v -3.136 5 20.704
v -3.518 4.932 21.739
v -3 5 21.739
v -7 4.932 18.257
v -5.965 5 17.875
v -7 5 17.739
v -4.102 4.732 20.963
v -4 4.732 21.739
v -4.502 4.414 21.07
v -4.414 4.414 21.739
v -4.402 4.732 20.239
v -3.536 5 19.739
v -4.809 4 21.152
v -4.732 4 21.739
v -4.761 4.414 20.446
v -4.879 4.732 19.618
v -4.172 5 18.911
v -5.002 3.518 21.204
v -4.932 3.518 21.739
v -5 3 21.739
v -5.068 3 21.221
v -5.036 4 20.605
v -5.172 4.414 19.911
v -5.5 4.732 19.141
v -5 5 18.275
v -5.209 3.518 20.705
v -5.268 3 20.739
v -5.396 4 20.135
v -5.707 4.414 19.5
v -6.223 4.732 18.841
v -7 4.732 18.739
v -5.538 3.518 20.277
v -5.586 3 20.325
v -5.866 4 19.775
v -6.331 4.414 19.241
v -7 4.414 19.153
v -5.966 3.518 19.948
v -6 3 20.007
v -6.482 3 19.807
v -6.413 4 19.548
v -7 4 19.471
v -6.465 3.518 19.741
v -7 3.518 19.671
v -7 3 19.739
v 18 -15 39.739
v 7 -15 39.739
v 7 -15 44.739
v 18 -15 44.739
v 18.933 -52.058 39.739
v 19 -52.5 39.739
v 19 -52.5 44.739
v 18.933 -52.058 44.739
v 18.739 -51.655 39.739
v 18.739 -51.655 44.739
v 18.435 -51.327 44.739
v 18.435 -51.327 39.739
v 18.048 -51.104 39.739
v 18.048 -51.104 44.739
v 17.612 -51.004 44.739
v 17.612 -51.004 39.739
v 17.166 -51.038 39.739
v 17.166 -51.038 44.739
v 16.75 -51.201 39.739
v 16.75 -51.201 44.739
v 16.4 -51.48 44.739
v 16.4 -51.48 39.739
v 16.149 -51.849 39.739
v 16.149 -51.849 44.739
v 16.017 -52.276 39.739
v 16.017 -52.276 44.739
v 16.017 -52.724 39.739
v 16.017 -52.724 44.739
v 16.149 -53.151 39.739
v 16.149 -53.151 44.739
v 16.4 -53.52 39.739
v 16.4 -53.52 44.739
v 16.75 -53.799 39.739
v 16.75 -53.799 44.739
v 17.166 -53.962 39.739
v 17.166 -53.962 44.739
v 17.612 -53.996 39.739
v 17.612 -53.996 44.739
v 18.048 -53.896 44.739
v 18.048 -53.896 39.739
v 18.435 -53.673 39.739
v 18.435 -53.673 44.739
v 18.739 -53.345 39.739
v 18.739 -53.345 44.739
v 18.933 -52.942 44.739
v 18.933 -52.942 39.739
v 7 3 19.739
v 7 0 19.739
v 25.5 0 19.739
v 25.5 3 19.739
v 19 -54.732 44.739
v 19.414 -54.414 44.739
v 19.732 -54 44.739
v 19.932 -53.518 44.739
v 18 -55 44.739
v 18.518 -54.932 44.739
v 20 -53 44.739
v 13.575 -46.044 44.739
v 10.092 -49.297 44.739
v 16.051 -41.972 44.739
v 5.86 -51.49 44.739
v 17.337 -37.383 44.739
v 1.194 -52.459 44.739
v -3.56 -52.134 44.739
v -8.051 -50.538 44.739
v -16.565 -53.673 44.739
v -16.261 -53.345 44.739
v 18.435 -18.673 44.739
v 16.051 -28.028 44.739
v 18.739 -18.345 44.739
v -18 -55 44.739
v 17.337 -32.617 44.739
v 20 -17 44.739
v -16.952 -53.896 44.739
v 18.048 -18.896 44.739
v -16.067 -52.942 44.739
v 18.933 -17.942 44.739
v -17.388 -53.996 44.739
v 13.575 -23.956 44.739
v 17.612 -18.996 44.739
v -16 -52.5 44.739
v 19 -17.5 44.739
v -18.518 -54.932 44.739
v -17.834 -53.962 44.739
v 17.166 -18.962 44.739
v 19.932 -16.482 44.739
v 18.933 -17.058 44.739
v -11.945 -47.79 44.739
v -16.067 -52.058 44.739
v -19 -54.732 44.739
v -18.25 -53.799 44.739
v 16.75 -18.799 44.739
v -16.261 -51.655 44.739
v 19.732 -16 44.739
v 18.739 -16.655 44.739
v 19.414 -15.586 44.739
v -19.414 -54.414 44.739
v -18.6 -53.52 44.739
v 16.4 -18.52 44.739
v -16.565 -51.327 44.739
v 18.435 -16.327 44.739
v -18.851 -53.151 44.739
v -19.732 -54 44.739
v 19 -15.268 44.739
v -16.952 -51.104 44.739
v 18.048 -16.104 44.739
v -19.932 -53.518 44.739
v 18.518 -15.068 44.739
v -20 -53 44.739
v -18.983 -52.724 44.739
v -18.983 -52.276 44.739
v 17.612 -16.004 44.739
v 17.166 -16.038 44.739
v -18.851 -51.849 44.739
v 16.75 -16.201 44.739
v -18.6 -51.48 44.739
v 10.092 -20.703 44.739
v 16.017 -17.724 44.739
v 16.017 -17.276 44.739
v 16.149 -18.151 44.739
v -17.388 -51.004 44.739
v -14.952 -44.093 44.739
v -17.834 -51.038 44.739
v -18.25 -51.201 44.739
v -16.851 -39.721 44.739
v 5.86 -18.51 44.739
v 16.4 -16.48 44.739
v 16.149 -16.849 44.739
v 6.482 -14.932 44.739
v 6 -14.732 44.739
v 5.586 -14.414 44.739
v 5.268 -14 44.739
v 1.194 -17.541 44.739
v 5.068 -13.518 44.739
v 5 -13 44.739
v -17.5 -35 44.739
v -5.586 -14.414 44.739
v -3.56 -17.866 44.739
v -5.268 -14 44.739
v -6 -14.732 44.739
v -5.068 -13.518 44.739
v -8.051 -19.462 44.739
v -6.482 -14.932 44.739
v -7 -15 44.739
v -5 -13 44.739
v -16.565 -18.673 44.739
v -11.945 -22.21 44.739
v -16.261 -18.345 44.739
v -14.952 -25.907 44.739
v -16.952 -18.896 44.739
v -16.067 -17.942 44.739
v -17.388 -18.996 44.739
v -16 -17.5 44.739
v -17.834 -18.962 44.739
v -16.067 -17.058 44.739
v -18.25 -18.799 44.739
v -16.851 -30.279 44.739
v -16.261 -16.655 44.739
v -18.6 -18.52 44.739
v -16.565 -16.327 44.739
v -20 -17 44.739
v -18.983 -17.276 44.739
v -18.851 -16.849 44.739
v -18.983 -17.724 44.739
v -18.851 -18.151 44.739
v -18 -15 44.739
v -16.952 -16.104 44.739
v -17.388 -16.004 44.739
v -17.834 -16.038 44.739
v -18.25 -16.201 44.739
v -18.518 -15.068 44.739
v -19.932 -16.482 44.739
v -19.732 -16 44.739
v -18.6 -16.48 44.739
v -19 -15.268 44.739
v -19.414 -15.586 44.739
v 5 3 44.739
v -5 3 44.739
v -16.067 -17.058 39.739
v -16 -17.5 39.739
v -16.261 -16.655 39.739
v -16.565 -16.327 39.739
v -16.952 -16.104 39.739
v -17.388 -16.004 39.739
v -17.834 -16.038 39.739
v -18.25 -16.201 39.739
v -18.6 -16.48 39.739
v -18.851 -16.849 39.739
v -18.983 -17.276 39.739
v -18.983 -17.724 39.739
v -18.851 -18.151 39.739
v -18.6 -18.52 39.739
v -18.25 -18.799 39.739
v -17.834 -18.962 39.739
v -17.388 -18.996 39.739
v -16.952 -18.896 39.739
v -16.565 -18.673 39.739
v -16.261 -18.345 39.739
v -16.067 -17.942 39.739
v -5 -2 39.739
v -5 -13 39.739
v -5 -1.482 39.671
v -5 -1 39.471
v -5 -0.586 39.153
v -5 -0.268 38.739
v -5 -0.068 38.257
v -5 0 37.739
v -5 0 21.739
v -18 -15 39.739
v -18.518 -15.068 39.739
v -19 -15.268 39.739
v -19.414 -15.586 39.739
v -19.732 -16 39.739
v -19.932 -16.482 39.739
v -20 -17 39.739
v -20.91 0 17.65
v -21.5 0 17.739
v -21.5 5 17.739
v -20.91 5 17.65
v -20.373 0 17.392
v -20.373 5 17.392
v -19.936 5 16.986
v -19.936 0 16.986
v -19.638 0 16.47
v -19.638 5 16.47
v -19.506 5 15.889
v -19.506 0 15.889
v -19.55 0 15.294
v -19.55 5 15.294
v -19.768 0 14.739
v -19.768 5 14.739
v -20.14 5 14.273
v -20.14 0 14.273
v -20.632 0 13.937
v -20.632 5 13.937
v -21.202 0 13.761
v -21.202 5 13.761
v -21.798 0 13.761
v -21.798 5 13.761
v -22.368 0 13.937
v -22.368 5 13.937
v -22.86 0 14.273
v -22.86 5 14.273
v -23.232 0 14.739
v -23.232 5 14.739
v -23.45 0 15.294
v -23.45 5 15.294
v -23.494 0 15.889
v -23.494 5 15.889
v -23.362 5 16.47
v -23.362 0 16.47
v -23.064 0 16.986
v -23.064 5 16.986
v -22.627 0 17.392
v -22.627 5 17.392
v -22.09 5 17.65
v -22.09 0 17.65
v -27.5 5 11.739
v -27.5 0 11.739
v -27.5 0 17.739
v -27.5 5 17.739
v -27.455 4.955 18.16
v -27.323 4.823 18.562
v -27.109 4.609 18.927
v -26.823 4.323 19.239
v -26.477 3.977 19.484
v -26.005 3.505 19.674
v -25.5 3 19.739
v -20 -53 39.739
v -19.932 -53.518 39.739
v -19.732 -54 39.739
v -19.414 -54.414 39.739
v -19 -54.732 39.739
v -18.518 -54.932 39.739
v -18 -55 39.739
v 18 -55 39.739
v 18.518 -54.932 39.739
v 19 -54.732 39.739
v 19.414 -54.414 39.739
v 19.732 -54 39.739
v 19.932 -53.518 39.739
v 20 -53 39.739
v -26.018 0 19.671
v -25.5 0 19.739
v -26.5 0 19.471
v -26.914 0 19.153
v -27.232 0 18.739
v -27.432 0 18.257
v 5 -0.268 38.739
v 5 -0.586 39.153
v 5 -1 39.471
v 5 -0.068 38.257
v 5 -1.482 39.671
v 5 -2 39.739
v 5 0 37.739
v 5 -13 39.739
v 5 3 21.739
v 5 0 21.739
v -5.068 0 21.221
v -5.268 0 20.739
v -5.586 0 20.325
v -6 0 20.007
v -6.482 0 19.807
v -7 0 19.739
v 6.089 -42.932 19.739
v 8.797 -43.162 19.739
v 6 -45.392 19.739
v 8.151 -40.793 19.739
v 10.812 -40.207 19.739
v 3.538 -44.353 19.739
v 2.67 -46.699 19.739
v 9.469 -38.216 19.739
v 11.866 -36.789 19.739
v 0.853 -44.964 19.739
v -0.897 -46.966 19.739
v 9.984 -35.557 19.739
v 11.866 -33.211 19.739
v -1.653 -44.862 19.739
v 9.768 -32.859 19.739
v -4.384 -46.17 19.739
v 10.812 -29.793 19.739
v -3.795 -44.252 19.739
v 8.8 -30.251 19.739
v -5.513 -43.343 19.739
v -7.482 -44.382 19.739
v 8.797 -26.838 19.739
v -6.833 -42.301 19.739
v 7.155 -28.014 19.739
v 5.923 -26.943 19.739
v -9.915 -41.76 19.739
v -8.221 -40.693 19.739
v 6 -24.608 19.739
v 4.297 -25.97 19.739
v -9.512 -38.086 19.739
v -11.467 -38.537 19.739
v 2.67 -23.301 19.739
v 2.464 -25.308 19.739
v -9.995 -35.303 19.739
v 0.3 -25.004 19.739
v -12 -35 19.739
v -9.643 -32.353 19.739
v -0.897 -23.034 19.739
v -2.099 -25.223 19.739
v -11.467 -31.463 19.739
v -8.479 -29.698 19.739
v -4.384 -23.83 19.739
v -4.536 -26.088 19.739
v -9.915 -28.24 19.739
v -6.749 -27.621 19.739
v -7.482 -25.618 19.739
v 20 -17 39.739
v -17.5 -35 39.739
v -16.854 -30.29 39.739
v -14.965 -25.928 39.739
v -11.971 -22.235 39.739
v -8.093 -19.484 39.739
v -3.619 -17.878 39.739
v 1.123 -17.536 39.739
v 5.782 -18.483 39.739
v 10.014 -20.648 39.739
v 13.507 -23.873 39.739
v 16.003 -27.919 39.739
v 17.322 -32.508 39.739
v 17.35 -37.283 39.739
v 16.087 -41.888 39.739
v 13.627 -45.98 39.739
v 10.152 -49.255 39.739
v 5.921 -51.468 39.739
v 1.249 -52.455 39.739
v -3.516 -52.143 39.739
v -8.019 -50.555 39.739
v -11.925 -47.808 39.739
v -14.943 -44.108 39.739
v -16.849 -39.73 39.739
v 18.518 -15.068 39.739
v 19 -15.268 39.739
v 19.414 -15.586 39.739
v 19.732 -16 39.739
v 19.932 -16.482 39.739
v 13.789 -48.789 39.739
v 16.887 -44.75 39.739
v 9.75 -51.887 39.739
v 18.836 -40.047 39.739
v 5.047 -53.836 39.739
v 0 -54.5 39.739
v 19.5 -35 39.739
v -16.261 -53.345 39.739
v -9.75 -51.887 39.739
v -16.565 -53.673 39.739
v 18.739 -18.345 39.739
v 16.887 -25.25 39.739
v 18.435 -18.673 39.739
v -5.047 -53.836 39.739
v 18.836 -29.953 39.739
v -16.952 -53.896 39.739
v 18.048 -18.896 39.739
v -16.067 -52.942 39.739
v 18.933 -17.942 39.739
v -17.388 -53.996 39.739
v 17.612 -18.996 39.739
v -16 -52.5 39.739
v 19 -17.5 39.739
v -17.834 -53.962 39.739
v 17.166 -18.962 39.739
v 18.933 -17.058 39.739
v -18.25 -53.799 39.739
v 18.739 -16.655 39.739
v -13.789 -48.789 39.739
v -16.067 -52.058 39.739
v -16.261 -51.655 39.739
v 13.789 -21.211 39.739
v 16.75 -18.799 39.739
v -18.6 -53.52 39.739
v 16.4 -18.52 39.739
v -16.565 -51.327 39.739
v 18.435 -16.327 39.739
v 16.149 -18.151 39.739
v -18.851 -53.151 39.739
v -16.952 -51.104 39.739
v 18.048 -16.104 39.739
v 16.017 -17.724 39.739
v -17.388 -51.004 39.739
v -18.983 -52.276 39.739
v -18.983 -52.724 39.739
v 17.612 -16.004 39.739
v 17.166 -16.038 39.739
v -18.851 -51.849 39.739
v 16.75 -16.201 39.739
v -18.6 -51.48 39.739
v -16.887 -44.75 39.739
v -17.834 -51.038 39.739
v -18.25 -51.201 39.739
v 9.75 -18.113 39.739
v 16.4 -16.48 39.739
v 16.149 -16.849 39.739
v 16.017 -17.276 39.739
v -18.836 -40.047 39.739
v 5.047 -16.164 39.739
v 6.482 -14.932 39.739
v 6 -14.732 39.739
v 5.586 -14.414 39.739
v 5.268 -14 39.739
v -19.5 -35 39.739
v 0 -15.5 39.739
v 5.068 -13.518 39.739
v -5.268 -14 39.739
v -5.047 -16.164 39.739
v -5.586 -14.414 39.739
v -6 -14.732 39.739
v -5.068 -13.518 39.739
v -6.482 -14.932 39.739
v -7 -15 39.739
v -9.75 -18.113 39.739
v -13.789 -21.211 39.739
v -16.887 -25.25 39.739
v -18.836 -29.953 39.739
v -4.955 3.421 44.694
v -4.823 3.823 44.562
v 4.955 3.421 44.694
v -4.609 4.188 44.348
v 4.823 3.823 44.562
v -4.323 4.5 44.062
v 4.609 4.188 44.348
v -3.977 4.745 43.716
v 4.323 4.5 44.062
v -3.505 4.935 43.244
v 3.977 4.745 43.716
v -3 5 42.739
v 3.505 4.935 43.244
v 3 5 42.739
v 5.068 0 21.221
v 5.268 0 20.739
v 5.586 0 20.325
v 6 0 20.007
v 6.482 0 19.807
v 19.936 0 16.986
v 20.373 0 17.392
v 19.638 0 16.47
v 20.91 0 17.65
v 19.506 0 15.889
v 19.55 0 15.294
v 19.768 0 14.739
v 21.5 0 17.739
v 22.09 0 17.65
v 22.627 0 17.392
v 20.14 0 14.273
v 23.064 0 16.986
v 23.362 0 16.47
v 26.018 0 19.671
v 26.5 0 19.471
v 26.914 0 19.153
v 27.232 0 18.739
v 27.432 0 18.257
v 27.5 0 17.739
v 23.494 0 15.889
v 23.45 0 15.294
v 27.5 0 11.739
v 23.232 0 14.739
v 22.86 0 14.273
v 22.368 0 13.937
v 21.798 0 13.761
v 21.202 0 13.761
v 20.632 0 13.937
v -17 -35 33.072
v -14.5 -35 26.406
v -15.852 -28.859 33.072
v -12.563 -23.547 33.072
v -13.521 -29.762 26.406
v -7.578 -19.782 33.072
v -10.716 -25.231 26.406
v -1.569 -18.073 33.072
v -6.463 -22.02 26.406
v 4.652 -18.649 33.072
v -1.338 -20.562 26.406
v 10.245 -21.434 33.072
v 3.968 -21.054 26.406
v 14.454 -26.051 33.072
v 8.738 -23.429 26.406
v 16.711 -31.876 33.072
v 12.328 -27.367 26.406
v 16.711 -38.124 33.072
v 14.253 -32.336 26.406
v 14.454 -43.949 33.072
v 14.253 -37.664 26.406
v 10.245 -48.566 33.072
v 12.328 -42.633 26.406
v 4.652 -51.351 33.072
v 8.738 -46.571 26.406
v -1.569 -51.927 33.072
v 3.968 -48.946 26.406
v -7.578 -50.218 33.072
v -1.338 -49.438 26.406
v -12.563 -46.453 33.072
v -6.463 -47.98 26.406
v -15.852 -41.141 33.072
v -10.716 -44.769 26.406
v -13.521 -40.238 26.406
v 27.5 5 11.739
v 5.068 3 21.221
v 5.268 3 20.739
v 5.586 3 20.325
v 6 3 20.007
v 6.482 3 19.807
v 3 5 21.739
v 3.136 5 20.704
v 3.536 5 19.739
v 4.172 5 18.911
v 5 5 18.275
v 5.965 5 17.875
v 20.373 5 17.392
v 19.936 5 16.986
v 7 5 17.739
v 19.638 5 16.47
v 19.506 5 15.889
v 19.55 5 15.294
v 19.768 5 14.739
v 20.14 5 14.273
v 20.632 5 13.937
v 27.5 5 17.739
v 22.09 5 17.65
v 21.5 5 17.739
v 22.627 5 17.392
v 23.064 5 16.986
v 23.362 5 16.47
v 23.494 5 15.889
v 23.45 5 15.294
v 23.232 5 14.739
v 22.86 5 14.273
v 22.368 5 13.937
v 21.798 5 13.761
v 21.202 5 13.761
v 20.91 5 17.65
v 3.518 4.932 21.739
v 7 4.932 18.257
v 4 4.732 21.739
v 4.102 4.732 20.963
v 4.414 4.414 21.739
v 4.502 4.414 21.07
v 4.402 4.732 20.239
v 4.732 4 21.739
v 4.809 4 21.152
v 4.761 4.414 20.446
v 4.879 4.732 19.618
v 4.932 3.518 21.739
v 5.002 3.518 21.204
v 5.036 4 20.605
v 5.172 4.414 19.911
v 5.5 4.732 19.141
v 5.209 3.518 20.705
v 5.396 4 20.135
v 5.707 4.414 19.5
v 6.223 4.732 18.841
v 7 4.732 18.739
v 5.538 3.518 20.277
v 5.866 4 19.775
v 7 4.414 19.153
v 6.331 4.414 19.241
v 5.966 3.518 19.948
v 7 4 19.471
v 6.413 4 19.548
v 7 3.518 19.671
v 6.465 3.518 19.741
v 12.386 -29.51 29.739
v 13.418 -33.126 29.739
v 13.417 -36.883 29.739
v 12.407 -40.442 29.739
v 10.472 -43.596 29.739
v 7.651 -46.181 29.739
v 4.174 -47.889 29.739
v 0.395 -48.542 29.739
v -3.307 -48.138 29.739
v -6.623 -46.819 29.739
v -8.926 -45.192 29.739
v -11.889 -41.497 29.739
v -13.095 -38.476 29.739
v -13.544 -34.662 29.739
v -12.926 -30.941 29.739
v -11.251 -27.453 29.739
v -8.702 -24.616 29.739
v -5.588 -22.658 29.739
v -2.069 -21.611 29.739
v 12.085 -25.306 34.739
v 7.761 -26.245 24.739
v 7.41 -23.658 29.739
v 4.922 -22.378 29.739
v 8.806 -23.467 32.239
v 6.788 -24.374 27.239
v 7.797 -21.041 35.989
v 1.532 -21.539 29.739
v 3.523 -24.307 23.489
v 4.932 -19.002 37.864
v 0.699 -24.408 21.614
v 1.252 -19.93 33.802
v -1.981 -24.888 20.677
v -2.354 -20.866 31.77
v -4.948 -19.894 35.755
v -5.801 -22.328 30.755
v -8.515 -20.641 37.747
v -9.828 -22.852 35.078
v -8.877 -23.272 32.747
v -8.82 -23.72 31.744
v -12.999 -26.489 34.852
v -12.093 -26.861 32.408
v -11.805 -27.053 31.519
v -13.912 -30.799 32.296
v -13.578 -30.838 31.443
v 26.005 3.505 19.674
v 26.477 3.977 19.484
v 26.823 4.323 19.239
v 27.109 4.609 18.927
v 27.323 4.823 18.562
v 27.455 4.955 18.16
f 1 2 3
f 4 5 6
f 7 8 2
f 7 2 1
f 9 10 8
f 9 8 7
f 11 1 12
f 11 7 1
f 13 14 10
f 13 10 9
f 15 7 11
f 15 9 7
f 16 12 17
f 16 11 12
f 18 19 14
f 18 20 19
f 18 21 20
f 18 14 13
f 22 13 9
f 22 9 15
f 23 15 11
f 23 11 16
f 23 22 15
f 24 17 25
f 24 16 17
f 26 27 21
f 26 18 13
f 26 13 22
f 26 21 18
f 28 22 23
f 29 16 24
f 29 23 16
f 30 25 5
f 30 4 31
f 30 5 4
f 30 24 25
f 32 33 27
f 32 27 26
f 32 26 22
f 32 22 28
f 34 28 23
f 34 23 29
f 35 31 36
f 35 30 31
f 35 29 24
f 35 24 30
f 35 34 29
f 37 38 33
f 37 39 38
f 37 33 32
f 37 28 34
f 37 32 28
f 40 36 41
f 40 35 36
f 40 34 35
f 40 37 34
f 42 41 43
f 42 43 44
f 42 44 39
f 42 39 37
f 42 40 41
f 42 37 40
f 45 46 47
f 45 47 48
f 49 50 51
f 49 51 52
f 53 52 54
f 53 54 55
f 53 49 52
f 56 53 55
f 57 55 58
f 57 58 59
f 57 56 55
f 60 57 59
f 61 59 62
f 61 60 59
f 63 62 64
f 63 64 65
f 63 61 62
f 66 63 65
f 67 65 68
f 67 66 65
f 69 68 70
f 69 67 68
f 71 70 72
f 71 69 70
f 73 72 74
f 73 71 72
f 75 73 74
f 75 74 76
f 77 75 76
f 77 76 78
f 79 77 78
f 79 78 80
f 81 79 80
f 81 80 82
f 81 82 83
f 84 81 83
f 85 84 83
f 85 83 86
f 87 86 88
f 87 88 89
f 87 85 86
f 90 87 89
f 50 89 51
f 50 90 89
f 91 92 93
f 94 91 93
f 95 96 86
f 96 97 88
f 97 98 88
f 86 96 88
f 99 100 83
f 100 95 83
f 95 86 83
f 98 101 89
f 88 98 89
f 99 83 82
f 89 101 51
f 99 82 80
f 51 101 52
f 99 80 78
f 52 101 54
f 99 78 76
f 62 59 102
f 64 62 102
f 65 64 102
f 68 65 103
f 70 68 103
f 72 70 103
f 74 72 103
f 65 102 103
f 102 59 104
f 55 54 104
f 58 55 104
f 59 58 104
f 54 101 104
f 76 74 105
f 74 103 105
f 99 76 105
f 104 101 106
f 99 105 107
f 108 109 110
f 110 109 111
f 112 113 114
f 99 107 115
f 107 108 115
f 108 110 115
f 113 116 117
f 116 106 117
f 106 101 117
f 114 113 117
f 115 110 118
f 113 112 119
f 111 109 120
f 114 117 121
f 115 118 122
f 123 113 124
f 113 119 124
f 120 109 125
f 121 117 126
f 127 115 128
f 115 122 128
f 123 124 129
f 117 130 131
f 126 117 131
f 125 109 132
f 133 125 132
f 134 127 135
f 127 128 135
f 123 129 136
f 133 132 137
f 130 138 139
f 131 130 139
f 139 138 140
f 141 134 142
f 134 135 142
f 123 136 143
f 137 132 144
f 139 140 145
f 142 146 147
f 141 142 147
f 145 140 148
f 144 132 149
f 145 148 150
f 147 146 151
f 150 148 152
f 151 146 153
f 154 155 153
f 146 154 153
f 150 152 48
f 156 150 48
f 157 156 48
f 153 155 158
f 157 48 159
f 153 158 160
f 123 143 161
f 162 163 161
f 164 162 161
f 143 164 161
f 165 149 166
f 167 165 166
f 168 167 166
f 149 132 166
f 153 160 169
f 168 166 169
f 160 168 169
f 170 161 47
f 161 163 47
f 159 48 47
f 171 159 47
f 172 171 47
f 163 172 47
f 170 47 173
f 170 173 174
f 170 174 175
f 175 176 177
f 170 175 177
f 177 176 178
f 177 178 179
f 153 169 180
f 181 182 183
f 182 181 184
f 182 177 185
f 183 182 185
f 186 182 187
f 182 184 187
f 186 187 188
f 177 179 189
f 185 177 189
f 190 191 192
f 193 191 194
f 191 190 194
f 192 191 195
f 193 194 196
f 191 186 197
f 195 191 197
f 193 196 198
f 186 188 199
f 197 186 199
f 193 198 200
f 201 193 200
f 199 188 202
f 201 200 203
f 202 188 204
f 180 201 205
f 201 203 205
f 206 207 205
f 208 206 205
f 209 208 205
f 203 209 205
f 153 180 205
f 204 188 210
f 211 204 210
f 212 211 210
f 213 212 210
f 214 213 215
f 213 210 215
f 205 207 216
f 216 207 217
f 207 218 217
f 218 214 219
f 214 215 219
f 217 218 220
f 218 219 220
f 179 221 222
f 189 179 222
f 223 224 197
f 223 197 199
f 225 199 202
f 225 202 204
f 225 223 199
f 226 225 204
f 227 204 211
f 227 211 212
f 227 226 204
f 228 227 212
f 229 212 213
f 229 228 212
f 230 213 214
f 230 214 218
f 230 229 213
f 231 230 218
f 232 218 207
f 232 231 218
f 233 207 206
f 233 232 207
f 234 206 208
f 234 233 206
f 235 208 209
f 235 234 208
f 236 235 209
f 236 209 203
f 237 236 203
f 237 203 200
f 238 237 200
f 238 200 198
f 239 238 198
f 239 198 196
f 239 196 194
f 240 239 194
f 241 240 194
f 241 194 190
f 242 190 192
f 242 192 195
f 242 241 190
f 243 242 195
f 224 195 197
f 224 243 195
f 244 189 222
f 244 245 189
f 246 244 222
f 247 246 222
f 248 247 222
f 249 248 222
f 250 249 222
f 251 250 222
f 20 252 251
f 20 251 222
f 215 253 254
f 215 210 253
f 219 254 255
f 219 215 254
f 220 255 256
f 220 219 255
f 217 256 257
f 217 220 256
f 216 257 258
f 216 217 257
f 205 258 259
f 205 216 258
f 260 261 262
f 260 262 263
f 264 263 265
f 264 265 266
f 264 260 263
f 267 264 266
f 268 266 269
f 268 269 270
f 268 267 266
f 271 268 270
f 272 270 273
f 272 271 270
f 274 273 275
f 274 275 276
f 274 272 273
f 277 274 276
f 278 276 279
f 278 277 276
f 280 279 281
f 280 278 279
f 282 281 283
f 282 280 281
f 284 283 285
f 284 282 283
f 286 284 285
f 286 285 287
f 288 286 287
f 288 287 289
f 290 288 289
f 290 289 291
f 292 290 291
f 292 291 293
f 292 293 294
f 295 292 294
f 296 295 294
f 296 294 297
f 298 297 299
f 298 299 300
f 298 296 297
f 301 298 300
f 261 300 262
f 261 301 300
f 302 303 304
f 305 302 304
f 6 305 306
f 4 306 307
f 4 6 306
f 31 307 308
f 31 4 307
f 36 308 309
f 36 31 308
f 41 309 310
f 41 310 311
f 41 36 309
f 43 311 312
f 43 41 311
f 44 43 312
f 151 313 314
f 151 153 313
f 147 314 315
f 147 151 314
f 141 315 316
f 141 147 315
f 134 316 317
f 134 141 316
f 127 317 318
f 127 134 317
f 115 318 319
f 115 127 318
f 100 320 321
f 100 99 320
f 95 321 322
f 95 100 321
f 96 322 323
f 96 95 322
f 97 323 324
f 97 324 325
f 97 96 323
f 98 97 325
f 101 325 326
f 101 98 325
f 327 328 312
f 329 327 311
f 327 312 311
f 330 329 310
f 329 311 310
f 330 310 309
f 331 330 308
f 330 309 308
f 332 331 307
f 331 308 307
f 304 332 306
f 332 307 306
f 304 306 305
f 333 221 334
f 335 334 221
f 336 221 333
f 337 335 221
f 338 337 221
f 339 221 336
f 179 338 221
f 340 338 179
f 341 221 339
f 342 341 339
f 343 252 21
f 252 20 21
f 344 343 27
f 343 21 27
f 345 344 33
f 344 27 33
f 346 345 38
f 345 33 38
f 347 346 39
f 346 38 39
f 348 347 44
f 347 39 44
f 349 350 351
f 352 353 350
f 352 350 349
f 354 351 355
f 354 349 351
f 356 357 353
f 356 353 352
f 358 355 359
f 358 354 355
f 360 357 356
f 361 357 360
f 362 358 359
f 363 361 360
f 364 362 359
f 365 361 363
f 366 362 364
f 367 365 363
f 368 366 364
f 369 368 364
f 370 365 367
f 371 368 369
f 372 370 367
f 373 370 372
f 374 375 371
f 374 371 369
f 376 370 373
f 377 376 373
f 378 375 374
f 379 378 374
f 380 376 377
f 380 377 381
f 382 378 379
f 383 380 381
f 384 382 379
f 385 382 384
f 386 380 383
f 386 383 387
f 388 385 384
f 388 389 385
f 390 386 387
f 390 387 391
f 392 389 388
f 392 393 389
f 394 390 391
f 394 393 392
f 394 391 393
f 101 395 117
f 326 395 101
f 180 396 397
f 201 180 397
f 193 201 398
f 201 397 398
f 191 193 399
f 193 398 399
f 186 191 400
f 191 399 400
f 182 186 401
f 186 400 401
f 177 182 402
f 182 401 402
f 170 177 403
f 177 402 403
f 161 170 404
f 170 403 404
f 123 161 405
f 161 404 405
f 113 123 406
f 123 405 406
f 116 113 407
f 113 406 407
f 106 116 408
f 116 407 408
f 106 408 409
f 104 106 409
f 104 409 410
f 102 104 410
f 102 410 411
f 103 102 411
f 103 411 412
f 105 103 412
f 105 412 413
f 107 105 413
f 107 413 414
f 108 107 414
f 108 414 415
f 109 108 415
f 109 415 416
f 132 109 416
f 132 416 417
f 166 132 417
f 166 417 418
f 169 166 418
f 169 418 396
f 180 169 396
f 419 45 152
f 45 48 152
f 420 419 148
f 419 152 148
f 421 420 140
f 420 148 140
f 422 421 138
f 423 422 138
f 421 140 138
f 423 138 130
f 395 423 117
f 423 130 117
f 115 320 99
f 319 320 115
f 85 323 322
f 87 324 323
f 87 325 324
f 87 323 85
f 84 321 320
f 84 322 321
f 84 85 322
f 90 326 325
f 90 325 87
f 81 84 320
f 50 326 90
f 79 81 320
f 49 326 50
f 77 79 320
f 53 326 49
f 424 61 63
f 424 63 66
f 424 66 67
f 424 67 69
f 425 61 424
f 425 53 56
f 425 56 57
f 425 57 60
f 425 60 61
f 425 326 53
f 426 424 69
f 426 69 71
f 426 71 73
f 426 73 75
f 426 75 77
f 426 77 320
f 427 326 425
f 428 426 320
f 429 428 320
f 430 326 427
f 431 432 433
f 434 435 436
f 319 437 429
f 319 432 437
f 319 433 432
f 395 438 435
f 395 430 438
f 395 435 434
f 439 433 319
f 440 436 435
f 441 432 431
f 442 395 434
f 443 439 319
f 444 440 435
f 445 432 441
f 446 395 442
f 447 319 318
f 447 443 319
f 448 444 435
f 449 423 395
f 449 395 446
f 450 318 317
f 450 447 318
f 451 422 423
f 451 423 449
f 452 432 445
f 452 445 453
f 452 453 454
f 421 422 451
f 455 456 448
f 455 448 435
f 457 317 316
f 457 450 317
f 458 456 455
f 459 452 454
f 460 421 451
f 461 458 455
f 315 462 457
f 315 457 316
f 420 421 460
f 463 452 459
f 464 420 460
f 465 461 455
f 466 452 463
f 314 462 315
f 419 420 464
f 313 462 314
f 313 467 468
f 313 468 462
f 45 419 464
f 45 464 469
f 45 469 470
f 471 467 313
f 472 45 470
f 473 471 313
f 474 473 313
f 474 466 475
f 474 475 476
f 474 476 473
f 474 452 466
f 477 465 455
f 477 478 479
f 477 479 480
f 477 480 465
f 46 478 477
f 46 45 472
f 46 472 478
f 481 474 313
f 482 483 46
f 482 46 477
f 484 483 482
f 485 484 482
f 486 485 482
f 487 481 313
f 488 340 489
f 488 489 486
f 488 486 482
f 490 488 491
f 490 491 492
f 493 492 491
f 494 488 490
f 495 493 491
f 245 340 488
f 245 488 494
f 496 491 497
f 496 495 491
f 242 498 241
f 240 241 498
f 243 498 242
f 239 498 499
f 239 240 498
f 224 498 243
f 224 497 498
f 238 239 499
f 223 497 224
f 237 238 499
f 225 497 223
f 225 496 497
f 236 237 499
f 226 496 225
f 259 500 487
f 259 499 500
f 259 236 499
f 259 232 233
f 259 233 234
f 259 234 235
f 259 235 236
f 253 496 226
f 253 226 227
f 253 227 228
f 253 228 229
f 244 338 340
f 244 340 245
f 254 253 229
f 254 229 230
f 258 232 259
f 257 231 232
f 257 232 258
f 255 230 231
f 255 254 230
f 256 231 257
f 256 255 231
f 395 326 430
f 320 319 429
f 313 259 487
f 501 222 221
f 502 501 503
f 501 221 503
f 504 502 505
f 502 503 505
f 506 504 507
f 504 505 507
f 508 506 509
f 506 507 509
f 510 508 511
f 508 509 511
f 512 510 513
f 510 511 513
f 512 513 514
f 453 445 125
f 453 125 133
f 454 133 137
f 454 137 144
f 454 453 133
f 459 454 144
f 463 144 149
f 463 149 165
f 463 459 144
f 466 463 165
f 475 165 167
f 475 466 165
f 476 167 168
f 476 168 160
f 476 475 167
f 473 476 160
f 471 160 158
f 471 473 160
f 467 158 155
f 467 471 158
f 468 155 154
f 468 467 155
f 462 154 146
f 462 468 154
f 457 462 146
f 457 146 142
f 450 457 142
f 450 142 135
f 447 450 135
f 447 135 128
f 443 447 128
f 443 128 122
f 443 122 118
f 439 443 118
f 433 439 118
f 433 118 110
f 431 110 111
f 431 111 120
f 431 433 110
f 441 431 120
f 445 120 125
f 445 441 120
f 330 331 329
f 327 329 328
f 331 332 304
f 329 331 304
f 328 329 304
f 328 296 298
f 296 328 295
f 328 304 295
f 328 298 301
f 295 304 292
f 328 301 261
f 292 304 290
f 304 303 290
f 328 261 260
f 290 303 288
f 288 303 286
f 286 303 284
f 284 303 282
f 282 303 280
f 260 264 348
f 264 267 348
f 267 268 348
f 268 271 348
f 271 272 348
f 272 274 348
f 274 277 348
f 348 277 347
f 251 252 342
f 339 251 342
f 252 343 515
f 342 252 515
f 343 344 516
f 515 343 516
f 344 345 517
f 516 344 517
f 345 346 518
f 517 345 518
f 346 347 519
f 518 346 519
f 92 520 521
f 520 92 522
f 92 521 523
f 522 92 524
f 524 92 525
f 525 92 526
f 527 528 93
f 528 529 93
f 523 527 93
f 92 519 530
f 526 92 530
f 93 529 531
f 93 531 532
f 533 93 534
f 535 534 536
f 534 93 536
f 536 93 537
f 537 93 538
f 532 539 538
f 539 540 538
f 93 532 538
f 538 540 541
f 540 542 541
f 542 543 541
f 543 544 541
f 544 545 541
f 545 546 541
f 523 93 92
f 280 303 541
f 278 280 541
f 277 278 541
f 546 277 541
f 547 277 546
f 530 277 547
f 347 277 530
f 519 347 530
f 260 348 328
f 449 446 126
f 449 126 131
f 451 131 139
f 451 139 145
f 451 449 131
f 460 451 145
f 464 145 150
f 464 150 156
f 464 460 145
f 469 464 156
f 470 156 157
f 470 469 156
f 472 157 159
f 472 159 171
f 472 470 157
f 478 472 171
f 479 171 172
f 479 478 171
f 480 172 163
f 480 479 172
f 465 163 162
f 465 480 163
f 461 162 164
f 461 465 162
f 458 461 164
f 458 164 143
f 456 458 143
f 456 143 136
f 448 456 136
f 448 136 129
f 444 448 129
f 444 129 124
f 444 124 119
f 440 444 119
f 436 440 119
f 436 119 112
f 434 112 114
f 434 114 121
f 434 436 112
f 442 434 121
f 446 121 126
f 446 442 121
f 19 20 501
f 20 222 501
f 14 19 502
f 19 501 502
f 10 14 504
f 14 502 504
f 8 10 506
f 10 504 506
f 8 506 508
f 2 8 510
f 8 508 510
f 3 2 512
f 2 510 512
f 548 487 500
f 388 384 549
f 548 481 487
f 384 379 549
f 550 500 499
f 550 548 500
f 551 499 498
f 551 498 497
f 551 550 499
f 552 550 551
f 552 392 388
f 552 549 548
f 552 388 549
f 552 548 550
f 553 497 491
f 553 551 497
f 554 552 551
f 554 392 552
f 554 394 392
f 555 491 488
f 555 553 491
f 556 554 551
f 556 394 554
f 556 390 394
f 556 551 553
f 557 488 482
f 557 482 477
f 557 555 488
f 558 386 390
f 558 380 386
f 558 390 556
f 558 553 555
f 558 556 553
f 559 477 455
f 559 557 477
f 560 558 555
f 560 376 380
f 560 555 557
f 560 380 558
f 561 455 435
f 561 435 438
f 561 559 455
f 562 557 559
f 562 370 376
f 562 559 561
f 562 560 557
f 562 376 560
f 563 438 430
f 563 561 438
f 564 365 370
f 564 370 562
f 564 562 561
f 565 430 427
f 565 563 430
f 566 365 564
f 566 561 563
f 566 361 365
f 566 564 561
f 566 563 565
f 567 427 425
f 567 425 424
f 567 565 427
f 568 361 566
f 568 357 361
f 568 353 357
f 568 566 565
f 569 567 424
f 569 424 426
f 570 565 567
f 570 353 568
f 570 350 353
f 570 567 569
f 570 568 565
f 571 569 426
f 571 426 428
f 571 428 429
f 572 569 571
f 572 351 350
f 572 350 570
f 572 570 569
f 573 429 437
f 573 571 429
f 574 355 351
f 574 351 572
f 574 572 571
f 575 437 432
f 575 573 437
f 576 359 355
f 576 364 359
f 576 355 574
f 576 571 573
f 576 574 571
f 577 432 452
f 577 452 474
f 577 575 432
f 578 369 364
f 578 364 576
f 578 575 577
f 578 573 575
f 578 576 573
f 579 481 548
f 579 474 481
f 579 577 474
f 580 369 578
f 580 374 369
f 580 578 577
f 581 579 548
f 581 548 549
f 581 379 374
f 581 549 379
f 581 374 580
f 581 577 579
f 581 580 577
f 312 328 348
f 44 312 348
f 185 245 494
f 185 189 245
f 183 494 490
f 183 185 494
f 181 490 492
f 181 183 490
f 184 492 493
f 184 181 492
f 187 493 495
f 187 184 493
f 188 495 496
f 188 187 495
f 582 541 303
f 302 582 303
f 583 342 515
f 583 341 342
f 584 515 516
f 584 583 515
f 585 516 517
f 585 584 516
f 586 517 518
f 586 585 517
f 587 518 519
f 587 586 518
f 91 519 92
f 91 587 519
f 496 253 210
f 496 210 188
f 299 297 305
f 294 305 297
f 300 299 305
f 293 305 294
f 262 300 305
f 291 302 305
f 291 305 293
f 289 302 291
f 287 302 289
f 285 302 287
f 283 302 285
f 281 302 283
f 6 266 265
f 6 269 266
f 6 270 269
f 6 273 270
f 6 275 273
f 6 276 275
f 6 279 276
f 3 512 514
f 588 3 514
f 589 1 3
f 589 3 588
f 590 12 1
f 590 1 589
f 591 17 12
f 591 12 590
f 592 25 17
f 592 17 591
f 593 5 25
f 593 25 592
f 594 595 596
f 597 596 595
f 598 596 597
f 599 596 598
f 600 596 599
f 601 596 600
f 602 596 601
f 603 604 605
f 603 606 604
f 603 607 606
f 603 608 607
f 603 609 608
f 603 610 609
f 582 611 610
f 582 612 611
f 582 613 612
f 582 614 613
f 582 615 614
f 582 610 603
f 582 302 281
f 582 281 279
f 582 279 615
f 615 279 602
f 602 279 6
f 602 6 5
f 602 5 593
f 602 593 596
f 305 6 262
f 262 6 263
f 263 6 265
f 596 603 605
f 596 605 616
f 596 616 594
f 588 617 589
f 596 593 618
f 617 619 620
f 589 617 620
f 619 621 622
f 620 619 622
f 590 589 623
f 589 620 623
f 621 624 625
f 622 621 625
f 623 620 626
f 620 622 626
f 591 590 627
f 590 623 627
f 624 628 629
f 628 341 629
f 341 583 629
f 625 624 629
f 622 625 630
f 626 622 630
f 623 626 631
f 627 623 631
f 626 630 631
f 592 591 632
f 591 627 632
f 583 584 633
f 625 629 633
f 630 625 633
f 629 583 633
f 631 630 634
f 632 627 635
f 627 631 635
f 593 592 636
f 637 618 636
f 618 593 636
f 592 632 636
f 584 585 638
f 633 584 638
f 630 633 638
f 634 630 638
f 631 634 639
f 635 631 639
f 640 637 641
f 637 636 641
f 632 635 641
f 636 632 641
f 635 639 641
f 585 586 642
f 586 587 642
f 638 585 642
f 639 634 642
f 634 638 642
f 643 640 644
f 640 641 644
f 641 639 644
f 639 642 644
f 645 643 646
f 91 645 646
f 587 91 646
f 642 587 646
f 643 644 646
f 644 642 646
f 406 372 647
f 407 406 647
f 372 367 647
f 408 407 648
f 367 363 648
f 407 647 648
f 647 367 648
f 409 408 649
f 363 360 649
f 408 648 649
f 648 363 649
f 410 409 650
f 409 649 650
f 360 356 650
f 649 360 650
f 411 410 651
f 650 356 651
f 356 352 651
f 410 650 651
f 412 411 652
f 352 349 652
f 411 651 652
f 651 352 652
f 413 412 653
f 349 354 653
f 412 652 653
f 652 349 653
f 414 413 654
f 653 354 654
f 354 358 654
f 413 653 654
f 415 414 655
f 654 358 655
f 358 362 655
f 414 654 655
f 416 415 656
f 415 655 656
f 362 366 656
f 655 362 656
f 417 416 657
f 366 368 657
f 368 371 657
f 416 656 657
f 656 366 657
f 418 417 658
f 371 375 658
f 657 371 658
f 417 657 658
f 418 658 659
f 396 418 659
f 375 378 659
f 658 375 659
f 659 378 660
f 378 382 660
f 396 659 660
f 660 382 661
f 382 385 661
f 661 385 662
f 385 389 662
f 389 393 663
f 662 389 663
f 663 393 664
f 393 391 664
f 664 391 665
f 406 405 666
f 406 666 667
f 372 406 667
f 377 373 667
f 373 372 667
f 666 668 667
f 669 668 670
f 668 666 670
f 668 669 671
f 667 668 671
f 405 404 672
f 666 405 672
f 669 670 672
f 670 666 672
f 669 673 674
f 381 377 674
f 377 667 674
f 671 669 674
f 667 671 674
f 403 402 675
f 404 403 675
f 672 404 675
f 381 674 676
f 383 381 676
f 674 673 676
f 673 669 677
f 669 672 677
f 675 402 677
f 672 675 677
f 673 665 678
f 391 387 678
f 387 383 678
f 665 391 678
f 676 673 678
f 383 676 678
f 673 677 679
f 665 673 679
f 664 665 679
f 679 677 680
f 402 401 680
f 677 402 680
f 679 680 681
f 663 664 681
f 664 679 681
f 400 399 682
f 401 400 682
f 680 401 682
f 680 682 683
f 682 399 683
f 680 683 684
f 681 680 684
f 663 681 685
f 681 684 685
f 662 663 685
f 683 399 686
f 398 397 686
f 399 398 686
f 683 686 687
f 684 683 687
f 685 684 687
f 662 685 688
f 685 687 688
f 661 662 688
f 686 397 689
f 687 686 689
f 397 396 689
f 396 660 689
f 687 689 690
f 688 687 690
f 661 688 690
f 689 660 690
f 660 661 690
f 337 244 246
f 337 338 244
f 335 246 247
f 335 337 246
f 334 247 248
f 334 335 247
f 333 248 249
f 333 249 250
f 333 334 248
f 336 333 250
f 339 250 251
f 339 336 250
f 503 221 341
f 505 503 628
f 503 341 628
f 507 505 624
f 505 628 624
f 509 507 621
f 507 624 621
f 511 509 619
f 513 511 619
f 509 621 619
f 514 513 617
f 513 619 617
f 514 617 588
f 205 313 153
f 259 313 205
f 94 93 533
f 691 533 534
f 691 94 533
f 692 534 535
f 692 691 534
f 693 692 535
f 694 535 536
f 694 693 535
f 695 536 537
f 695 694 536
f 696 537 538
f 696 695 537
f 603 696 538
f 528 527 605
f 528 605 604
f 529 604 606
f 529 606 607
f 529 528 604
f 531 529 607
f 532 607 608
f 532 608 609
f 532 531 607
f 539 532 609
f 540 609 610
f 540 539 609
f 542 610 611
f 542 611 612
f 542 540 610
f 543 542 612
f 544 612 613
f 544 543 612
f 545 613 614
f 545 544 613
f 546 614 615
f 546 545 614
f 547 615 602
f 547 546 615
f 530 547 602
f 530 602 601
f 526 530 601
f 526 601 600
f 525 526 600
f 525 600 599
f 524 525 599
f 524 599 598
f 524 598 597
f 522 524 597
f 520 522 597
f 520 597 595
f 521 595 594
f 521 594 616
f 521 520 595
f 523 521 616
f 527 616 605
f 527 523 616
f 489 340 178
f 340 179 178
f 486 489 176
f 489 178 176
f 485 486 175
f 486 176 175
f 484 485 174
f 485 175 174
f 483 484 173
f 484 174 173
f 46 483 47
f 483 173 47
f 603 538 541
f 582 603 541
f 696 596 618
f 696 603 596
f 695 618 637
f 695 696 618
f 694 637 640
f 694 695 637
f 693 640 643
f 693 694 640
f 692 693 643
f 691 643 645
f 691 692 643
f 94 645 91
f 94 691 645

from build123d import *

# Parameters (mm, degrees)
ESQUISSE2_R             = 2
BOSS_EXTRU_1_DEPTH      = 5
ESQUISSE3_R             = 1.5
BOSS_EXTRU_2_DEPTH      = 5
ESQUISSE5_R             = 17.5
ENL_V_MAT_EXTRU_1_DEPTH = 68.566633777
ESQUISSE7_R             = 19.5
ESQUISSE8_R             = 12
CONG_2_R                = 2


with BuildPart() as part:
    # Esquisse2 → Boss.-Extru.1 (new body)
    with BuildSketch(Plane(origin=(0, 0, 0), x_dir=(1, 0, 0), z_dir=(0, 1, 0))):
        Polygon((5, -19.739092363), (27.5, -19.739092363), (27.5, -11.739092363), (-27.5, -11.739092363), (-27.5, -19.739092363), (-5, -19.739092363), (-5, -39.739092363), (5, -39.739092363), align=None)
        with Locations(Location((-21.5, -15.739092363, 0), (0, 0, 270))):
            Circle(ESQUISSE2_R, mode=Mode.SUBTRACT)
        with Locations(Location((21.5, -15.739092363, 0), (0, 0, 270))):
            Circle(ESQUISSE2_R, mode=Mode.SUBTRACT)
    extrude(amount=BOSS_EXTRU_1_DEPTH)

    # Esquisse3 → Boss.-Extru.2 (add)
    with BuildSketch(Plane.XY.offset(39.739092363)):
        Polygon((-5, 5), (5, 5), (5, -15), (20, -15), (20, -55), (-20, -55), (-20, -15), (-5, -15), align=None)
        with Locations((-17.5, -17.5)):
            Circle(ESQUISSE3_R, mode=Mode.SUBTRACT)
        with Locations((17.5, -17.5)):
            Circle(ESQUISSE3_R, mode=Mode.SUBTRACT)
        with Locations((17.5, -52.5)):
            Circle(ESQUISSE3_R, mode=Mode.SUBTRACT)
        with Locations((-17.5, -52.5)):
            Circle(ESQUISSE3_R, mode=Mode.SUBTRACT)
    extrude(amount=BOSS_EXTRU_2_DEPTH)

    # Esquisse5 → Enlèv. mat.-Extru.1 (cut, through all)
    with BuildSketch(Plane(origin=(0, 0, 39.739092363), x_dir=(-1, 0, 0), z_dir=(0, 0, -1))):
        with Locations((0, -35)):
            Circle(ESQUISSE5_R)
    extrude(amount=-ENL_V_MAT_EXTRU_1_DEPTH, mode=Mode.SUBTRACT)

    # Esquisse7 → Lissage3 section 0
    with BuildSketch(Plane(origin=(0, 0, 39.739092363), x_dir=(-1, 0, 0), z_dir=(0, 0, -1))):
        with Locations((0, -35)):
            Circle(ESQUISSE7_R)
    # Esquisse8 → Lissage3 section 1
    with BuildSketch(Plane(origin=(0, 0, 19.739092363), x_dir=(-1, 0, 0), z_dir=(0, 0, -1))):
        with Locations((0, -35)):
            Circle(ESQUISSE8_R)
    loft()

    # Enlèvement de matière-Lissage1: read off the stored shape, not the designer's step
    # Enlèvement de matière-Lissage1: loft between two sections, ruled curve by curve
    enl_vement_de_mati_re_lissage1_from = [
        Edge.make_bspline([(16.003401512, -27.918959112, 39.739092363), (30.165483288, -59.925762135, 39.739092363), (-1.841319736, -74.087843911, 39.739092363), (-16.003401512, -42.081040888, 39.739092363), (-30.165483288, -10.074237865, 39.739092363), (1.841319736, 4.087843911, 39.739092363), (16.003401512, -27.918959112, 39.739092363)], [0, 0, 0, 0, 0.5, 0.5, 0.5, 1, 1, 1, 1], 3, [1, 0.333333333, 0.333333333, 1, 0.333333333, 0.333333333, 1]),
    ]
    enl_vement_de_mati_re_lissage1_to = [
        Edge.make_bspline([(7.154976715, -28.013848827, 19.739092363), (21.127279061, -42.323802256, 19.739092363), (6.817325632, -56.296104602, 19.739092363), (-7.154976715, -41.986151173, 19.739092363), (-21.127279061, -27.676197744, 19.739092363), (-6.817325632, -13.703895398, 19.739092363), (7.154976715, -28.013848827, 19.739092363)], [0, 0, 0, 0, 0.5, 0.5, 0.5, 1, 1, 1, 1], 3, [1, 0.333333333, 0.333333333, 1, 0.333333333, 0.333333333, 1]),
    ]
    enl_vement_de_mati_re_lissage1 = Solid(Shell([*[Face.make_surface_from_curves(enl_vement_de_mati_re_lissage1_from[k], enl_vement_de_mati_re_lissage1_to[k]) for k in range(1)], Face(Wire(enl_vement_de_mati_re_lissage1_from)), Face(Wire(enl_vement_de_mati_re_lissage1_to))]))
    add(enl_vement_de_mati_re_lissage1, mode=Mode.SUBTRACT)

    # Congé2
    cong_2_edges = [part.edges().sort_by_distance(p)[0] for p in [
        (-20, -15, 42.239092363),
        (-20, -55, 42.239092363),
        (20, -55, 42.239092363),
        (20, -15, 42.239092363),
        (-5, 5, 32.239092363),
        (5, 5, 32.239092363),
        (5, -15, 42.239092363),
        (-5, -15, 42.239092363),
        (-16.25, 5, 19.739092363),
        (16.25, 5, 19.739092363),
        (0, 5, 44.739092363),
        (27.5, 2.5, 19.739092363),
        (-27.5, 2.5, 19.739092363),
        (-5, 2.5, 19.739092363),
        (5, 2.5, 19.739092363),
        (0, 0, 39.739092363),
    ]]
    fillet(cong_2_edges, radius=CONG_2_R - 0.0001)  # a hair under: the kernel refuses the full size


solid = part.part
